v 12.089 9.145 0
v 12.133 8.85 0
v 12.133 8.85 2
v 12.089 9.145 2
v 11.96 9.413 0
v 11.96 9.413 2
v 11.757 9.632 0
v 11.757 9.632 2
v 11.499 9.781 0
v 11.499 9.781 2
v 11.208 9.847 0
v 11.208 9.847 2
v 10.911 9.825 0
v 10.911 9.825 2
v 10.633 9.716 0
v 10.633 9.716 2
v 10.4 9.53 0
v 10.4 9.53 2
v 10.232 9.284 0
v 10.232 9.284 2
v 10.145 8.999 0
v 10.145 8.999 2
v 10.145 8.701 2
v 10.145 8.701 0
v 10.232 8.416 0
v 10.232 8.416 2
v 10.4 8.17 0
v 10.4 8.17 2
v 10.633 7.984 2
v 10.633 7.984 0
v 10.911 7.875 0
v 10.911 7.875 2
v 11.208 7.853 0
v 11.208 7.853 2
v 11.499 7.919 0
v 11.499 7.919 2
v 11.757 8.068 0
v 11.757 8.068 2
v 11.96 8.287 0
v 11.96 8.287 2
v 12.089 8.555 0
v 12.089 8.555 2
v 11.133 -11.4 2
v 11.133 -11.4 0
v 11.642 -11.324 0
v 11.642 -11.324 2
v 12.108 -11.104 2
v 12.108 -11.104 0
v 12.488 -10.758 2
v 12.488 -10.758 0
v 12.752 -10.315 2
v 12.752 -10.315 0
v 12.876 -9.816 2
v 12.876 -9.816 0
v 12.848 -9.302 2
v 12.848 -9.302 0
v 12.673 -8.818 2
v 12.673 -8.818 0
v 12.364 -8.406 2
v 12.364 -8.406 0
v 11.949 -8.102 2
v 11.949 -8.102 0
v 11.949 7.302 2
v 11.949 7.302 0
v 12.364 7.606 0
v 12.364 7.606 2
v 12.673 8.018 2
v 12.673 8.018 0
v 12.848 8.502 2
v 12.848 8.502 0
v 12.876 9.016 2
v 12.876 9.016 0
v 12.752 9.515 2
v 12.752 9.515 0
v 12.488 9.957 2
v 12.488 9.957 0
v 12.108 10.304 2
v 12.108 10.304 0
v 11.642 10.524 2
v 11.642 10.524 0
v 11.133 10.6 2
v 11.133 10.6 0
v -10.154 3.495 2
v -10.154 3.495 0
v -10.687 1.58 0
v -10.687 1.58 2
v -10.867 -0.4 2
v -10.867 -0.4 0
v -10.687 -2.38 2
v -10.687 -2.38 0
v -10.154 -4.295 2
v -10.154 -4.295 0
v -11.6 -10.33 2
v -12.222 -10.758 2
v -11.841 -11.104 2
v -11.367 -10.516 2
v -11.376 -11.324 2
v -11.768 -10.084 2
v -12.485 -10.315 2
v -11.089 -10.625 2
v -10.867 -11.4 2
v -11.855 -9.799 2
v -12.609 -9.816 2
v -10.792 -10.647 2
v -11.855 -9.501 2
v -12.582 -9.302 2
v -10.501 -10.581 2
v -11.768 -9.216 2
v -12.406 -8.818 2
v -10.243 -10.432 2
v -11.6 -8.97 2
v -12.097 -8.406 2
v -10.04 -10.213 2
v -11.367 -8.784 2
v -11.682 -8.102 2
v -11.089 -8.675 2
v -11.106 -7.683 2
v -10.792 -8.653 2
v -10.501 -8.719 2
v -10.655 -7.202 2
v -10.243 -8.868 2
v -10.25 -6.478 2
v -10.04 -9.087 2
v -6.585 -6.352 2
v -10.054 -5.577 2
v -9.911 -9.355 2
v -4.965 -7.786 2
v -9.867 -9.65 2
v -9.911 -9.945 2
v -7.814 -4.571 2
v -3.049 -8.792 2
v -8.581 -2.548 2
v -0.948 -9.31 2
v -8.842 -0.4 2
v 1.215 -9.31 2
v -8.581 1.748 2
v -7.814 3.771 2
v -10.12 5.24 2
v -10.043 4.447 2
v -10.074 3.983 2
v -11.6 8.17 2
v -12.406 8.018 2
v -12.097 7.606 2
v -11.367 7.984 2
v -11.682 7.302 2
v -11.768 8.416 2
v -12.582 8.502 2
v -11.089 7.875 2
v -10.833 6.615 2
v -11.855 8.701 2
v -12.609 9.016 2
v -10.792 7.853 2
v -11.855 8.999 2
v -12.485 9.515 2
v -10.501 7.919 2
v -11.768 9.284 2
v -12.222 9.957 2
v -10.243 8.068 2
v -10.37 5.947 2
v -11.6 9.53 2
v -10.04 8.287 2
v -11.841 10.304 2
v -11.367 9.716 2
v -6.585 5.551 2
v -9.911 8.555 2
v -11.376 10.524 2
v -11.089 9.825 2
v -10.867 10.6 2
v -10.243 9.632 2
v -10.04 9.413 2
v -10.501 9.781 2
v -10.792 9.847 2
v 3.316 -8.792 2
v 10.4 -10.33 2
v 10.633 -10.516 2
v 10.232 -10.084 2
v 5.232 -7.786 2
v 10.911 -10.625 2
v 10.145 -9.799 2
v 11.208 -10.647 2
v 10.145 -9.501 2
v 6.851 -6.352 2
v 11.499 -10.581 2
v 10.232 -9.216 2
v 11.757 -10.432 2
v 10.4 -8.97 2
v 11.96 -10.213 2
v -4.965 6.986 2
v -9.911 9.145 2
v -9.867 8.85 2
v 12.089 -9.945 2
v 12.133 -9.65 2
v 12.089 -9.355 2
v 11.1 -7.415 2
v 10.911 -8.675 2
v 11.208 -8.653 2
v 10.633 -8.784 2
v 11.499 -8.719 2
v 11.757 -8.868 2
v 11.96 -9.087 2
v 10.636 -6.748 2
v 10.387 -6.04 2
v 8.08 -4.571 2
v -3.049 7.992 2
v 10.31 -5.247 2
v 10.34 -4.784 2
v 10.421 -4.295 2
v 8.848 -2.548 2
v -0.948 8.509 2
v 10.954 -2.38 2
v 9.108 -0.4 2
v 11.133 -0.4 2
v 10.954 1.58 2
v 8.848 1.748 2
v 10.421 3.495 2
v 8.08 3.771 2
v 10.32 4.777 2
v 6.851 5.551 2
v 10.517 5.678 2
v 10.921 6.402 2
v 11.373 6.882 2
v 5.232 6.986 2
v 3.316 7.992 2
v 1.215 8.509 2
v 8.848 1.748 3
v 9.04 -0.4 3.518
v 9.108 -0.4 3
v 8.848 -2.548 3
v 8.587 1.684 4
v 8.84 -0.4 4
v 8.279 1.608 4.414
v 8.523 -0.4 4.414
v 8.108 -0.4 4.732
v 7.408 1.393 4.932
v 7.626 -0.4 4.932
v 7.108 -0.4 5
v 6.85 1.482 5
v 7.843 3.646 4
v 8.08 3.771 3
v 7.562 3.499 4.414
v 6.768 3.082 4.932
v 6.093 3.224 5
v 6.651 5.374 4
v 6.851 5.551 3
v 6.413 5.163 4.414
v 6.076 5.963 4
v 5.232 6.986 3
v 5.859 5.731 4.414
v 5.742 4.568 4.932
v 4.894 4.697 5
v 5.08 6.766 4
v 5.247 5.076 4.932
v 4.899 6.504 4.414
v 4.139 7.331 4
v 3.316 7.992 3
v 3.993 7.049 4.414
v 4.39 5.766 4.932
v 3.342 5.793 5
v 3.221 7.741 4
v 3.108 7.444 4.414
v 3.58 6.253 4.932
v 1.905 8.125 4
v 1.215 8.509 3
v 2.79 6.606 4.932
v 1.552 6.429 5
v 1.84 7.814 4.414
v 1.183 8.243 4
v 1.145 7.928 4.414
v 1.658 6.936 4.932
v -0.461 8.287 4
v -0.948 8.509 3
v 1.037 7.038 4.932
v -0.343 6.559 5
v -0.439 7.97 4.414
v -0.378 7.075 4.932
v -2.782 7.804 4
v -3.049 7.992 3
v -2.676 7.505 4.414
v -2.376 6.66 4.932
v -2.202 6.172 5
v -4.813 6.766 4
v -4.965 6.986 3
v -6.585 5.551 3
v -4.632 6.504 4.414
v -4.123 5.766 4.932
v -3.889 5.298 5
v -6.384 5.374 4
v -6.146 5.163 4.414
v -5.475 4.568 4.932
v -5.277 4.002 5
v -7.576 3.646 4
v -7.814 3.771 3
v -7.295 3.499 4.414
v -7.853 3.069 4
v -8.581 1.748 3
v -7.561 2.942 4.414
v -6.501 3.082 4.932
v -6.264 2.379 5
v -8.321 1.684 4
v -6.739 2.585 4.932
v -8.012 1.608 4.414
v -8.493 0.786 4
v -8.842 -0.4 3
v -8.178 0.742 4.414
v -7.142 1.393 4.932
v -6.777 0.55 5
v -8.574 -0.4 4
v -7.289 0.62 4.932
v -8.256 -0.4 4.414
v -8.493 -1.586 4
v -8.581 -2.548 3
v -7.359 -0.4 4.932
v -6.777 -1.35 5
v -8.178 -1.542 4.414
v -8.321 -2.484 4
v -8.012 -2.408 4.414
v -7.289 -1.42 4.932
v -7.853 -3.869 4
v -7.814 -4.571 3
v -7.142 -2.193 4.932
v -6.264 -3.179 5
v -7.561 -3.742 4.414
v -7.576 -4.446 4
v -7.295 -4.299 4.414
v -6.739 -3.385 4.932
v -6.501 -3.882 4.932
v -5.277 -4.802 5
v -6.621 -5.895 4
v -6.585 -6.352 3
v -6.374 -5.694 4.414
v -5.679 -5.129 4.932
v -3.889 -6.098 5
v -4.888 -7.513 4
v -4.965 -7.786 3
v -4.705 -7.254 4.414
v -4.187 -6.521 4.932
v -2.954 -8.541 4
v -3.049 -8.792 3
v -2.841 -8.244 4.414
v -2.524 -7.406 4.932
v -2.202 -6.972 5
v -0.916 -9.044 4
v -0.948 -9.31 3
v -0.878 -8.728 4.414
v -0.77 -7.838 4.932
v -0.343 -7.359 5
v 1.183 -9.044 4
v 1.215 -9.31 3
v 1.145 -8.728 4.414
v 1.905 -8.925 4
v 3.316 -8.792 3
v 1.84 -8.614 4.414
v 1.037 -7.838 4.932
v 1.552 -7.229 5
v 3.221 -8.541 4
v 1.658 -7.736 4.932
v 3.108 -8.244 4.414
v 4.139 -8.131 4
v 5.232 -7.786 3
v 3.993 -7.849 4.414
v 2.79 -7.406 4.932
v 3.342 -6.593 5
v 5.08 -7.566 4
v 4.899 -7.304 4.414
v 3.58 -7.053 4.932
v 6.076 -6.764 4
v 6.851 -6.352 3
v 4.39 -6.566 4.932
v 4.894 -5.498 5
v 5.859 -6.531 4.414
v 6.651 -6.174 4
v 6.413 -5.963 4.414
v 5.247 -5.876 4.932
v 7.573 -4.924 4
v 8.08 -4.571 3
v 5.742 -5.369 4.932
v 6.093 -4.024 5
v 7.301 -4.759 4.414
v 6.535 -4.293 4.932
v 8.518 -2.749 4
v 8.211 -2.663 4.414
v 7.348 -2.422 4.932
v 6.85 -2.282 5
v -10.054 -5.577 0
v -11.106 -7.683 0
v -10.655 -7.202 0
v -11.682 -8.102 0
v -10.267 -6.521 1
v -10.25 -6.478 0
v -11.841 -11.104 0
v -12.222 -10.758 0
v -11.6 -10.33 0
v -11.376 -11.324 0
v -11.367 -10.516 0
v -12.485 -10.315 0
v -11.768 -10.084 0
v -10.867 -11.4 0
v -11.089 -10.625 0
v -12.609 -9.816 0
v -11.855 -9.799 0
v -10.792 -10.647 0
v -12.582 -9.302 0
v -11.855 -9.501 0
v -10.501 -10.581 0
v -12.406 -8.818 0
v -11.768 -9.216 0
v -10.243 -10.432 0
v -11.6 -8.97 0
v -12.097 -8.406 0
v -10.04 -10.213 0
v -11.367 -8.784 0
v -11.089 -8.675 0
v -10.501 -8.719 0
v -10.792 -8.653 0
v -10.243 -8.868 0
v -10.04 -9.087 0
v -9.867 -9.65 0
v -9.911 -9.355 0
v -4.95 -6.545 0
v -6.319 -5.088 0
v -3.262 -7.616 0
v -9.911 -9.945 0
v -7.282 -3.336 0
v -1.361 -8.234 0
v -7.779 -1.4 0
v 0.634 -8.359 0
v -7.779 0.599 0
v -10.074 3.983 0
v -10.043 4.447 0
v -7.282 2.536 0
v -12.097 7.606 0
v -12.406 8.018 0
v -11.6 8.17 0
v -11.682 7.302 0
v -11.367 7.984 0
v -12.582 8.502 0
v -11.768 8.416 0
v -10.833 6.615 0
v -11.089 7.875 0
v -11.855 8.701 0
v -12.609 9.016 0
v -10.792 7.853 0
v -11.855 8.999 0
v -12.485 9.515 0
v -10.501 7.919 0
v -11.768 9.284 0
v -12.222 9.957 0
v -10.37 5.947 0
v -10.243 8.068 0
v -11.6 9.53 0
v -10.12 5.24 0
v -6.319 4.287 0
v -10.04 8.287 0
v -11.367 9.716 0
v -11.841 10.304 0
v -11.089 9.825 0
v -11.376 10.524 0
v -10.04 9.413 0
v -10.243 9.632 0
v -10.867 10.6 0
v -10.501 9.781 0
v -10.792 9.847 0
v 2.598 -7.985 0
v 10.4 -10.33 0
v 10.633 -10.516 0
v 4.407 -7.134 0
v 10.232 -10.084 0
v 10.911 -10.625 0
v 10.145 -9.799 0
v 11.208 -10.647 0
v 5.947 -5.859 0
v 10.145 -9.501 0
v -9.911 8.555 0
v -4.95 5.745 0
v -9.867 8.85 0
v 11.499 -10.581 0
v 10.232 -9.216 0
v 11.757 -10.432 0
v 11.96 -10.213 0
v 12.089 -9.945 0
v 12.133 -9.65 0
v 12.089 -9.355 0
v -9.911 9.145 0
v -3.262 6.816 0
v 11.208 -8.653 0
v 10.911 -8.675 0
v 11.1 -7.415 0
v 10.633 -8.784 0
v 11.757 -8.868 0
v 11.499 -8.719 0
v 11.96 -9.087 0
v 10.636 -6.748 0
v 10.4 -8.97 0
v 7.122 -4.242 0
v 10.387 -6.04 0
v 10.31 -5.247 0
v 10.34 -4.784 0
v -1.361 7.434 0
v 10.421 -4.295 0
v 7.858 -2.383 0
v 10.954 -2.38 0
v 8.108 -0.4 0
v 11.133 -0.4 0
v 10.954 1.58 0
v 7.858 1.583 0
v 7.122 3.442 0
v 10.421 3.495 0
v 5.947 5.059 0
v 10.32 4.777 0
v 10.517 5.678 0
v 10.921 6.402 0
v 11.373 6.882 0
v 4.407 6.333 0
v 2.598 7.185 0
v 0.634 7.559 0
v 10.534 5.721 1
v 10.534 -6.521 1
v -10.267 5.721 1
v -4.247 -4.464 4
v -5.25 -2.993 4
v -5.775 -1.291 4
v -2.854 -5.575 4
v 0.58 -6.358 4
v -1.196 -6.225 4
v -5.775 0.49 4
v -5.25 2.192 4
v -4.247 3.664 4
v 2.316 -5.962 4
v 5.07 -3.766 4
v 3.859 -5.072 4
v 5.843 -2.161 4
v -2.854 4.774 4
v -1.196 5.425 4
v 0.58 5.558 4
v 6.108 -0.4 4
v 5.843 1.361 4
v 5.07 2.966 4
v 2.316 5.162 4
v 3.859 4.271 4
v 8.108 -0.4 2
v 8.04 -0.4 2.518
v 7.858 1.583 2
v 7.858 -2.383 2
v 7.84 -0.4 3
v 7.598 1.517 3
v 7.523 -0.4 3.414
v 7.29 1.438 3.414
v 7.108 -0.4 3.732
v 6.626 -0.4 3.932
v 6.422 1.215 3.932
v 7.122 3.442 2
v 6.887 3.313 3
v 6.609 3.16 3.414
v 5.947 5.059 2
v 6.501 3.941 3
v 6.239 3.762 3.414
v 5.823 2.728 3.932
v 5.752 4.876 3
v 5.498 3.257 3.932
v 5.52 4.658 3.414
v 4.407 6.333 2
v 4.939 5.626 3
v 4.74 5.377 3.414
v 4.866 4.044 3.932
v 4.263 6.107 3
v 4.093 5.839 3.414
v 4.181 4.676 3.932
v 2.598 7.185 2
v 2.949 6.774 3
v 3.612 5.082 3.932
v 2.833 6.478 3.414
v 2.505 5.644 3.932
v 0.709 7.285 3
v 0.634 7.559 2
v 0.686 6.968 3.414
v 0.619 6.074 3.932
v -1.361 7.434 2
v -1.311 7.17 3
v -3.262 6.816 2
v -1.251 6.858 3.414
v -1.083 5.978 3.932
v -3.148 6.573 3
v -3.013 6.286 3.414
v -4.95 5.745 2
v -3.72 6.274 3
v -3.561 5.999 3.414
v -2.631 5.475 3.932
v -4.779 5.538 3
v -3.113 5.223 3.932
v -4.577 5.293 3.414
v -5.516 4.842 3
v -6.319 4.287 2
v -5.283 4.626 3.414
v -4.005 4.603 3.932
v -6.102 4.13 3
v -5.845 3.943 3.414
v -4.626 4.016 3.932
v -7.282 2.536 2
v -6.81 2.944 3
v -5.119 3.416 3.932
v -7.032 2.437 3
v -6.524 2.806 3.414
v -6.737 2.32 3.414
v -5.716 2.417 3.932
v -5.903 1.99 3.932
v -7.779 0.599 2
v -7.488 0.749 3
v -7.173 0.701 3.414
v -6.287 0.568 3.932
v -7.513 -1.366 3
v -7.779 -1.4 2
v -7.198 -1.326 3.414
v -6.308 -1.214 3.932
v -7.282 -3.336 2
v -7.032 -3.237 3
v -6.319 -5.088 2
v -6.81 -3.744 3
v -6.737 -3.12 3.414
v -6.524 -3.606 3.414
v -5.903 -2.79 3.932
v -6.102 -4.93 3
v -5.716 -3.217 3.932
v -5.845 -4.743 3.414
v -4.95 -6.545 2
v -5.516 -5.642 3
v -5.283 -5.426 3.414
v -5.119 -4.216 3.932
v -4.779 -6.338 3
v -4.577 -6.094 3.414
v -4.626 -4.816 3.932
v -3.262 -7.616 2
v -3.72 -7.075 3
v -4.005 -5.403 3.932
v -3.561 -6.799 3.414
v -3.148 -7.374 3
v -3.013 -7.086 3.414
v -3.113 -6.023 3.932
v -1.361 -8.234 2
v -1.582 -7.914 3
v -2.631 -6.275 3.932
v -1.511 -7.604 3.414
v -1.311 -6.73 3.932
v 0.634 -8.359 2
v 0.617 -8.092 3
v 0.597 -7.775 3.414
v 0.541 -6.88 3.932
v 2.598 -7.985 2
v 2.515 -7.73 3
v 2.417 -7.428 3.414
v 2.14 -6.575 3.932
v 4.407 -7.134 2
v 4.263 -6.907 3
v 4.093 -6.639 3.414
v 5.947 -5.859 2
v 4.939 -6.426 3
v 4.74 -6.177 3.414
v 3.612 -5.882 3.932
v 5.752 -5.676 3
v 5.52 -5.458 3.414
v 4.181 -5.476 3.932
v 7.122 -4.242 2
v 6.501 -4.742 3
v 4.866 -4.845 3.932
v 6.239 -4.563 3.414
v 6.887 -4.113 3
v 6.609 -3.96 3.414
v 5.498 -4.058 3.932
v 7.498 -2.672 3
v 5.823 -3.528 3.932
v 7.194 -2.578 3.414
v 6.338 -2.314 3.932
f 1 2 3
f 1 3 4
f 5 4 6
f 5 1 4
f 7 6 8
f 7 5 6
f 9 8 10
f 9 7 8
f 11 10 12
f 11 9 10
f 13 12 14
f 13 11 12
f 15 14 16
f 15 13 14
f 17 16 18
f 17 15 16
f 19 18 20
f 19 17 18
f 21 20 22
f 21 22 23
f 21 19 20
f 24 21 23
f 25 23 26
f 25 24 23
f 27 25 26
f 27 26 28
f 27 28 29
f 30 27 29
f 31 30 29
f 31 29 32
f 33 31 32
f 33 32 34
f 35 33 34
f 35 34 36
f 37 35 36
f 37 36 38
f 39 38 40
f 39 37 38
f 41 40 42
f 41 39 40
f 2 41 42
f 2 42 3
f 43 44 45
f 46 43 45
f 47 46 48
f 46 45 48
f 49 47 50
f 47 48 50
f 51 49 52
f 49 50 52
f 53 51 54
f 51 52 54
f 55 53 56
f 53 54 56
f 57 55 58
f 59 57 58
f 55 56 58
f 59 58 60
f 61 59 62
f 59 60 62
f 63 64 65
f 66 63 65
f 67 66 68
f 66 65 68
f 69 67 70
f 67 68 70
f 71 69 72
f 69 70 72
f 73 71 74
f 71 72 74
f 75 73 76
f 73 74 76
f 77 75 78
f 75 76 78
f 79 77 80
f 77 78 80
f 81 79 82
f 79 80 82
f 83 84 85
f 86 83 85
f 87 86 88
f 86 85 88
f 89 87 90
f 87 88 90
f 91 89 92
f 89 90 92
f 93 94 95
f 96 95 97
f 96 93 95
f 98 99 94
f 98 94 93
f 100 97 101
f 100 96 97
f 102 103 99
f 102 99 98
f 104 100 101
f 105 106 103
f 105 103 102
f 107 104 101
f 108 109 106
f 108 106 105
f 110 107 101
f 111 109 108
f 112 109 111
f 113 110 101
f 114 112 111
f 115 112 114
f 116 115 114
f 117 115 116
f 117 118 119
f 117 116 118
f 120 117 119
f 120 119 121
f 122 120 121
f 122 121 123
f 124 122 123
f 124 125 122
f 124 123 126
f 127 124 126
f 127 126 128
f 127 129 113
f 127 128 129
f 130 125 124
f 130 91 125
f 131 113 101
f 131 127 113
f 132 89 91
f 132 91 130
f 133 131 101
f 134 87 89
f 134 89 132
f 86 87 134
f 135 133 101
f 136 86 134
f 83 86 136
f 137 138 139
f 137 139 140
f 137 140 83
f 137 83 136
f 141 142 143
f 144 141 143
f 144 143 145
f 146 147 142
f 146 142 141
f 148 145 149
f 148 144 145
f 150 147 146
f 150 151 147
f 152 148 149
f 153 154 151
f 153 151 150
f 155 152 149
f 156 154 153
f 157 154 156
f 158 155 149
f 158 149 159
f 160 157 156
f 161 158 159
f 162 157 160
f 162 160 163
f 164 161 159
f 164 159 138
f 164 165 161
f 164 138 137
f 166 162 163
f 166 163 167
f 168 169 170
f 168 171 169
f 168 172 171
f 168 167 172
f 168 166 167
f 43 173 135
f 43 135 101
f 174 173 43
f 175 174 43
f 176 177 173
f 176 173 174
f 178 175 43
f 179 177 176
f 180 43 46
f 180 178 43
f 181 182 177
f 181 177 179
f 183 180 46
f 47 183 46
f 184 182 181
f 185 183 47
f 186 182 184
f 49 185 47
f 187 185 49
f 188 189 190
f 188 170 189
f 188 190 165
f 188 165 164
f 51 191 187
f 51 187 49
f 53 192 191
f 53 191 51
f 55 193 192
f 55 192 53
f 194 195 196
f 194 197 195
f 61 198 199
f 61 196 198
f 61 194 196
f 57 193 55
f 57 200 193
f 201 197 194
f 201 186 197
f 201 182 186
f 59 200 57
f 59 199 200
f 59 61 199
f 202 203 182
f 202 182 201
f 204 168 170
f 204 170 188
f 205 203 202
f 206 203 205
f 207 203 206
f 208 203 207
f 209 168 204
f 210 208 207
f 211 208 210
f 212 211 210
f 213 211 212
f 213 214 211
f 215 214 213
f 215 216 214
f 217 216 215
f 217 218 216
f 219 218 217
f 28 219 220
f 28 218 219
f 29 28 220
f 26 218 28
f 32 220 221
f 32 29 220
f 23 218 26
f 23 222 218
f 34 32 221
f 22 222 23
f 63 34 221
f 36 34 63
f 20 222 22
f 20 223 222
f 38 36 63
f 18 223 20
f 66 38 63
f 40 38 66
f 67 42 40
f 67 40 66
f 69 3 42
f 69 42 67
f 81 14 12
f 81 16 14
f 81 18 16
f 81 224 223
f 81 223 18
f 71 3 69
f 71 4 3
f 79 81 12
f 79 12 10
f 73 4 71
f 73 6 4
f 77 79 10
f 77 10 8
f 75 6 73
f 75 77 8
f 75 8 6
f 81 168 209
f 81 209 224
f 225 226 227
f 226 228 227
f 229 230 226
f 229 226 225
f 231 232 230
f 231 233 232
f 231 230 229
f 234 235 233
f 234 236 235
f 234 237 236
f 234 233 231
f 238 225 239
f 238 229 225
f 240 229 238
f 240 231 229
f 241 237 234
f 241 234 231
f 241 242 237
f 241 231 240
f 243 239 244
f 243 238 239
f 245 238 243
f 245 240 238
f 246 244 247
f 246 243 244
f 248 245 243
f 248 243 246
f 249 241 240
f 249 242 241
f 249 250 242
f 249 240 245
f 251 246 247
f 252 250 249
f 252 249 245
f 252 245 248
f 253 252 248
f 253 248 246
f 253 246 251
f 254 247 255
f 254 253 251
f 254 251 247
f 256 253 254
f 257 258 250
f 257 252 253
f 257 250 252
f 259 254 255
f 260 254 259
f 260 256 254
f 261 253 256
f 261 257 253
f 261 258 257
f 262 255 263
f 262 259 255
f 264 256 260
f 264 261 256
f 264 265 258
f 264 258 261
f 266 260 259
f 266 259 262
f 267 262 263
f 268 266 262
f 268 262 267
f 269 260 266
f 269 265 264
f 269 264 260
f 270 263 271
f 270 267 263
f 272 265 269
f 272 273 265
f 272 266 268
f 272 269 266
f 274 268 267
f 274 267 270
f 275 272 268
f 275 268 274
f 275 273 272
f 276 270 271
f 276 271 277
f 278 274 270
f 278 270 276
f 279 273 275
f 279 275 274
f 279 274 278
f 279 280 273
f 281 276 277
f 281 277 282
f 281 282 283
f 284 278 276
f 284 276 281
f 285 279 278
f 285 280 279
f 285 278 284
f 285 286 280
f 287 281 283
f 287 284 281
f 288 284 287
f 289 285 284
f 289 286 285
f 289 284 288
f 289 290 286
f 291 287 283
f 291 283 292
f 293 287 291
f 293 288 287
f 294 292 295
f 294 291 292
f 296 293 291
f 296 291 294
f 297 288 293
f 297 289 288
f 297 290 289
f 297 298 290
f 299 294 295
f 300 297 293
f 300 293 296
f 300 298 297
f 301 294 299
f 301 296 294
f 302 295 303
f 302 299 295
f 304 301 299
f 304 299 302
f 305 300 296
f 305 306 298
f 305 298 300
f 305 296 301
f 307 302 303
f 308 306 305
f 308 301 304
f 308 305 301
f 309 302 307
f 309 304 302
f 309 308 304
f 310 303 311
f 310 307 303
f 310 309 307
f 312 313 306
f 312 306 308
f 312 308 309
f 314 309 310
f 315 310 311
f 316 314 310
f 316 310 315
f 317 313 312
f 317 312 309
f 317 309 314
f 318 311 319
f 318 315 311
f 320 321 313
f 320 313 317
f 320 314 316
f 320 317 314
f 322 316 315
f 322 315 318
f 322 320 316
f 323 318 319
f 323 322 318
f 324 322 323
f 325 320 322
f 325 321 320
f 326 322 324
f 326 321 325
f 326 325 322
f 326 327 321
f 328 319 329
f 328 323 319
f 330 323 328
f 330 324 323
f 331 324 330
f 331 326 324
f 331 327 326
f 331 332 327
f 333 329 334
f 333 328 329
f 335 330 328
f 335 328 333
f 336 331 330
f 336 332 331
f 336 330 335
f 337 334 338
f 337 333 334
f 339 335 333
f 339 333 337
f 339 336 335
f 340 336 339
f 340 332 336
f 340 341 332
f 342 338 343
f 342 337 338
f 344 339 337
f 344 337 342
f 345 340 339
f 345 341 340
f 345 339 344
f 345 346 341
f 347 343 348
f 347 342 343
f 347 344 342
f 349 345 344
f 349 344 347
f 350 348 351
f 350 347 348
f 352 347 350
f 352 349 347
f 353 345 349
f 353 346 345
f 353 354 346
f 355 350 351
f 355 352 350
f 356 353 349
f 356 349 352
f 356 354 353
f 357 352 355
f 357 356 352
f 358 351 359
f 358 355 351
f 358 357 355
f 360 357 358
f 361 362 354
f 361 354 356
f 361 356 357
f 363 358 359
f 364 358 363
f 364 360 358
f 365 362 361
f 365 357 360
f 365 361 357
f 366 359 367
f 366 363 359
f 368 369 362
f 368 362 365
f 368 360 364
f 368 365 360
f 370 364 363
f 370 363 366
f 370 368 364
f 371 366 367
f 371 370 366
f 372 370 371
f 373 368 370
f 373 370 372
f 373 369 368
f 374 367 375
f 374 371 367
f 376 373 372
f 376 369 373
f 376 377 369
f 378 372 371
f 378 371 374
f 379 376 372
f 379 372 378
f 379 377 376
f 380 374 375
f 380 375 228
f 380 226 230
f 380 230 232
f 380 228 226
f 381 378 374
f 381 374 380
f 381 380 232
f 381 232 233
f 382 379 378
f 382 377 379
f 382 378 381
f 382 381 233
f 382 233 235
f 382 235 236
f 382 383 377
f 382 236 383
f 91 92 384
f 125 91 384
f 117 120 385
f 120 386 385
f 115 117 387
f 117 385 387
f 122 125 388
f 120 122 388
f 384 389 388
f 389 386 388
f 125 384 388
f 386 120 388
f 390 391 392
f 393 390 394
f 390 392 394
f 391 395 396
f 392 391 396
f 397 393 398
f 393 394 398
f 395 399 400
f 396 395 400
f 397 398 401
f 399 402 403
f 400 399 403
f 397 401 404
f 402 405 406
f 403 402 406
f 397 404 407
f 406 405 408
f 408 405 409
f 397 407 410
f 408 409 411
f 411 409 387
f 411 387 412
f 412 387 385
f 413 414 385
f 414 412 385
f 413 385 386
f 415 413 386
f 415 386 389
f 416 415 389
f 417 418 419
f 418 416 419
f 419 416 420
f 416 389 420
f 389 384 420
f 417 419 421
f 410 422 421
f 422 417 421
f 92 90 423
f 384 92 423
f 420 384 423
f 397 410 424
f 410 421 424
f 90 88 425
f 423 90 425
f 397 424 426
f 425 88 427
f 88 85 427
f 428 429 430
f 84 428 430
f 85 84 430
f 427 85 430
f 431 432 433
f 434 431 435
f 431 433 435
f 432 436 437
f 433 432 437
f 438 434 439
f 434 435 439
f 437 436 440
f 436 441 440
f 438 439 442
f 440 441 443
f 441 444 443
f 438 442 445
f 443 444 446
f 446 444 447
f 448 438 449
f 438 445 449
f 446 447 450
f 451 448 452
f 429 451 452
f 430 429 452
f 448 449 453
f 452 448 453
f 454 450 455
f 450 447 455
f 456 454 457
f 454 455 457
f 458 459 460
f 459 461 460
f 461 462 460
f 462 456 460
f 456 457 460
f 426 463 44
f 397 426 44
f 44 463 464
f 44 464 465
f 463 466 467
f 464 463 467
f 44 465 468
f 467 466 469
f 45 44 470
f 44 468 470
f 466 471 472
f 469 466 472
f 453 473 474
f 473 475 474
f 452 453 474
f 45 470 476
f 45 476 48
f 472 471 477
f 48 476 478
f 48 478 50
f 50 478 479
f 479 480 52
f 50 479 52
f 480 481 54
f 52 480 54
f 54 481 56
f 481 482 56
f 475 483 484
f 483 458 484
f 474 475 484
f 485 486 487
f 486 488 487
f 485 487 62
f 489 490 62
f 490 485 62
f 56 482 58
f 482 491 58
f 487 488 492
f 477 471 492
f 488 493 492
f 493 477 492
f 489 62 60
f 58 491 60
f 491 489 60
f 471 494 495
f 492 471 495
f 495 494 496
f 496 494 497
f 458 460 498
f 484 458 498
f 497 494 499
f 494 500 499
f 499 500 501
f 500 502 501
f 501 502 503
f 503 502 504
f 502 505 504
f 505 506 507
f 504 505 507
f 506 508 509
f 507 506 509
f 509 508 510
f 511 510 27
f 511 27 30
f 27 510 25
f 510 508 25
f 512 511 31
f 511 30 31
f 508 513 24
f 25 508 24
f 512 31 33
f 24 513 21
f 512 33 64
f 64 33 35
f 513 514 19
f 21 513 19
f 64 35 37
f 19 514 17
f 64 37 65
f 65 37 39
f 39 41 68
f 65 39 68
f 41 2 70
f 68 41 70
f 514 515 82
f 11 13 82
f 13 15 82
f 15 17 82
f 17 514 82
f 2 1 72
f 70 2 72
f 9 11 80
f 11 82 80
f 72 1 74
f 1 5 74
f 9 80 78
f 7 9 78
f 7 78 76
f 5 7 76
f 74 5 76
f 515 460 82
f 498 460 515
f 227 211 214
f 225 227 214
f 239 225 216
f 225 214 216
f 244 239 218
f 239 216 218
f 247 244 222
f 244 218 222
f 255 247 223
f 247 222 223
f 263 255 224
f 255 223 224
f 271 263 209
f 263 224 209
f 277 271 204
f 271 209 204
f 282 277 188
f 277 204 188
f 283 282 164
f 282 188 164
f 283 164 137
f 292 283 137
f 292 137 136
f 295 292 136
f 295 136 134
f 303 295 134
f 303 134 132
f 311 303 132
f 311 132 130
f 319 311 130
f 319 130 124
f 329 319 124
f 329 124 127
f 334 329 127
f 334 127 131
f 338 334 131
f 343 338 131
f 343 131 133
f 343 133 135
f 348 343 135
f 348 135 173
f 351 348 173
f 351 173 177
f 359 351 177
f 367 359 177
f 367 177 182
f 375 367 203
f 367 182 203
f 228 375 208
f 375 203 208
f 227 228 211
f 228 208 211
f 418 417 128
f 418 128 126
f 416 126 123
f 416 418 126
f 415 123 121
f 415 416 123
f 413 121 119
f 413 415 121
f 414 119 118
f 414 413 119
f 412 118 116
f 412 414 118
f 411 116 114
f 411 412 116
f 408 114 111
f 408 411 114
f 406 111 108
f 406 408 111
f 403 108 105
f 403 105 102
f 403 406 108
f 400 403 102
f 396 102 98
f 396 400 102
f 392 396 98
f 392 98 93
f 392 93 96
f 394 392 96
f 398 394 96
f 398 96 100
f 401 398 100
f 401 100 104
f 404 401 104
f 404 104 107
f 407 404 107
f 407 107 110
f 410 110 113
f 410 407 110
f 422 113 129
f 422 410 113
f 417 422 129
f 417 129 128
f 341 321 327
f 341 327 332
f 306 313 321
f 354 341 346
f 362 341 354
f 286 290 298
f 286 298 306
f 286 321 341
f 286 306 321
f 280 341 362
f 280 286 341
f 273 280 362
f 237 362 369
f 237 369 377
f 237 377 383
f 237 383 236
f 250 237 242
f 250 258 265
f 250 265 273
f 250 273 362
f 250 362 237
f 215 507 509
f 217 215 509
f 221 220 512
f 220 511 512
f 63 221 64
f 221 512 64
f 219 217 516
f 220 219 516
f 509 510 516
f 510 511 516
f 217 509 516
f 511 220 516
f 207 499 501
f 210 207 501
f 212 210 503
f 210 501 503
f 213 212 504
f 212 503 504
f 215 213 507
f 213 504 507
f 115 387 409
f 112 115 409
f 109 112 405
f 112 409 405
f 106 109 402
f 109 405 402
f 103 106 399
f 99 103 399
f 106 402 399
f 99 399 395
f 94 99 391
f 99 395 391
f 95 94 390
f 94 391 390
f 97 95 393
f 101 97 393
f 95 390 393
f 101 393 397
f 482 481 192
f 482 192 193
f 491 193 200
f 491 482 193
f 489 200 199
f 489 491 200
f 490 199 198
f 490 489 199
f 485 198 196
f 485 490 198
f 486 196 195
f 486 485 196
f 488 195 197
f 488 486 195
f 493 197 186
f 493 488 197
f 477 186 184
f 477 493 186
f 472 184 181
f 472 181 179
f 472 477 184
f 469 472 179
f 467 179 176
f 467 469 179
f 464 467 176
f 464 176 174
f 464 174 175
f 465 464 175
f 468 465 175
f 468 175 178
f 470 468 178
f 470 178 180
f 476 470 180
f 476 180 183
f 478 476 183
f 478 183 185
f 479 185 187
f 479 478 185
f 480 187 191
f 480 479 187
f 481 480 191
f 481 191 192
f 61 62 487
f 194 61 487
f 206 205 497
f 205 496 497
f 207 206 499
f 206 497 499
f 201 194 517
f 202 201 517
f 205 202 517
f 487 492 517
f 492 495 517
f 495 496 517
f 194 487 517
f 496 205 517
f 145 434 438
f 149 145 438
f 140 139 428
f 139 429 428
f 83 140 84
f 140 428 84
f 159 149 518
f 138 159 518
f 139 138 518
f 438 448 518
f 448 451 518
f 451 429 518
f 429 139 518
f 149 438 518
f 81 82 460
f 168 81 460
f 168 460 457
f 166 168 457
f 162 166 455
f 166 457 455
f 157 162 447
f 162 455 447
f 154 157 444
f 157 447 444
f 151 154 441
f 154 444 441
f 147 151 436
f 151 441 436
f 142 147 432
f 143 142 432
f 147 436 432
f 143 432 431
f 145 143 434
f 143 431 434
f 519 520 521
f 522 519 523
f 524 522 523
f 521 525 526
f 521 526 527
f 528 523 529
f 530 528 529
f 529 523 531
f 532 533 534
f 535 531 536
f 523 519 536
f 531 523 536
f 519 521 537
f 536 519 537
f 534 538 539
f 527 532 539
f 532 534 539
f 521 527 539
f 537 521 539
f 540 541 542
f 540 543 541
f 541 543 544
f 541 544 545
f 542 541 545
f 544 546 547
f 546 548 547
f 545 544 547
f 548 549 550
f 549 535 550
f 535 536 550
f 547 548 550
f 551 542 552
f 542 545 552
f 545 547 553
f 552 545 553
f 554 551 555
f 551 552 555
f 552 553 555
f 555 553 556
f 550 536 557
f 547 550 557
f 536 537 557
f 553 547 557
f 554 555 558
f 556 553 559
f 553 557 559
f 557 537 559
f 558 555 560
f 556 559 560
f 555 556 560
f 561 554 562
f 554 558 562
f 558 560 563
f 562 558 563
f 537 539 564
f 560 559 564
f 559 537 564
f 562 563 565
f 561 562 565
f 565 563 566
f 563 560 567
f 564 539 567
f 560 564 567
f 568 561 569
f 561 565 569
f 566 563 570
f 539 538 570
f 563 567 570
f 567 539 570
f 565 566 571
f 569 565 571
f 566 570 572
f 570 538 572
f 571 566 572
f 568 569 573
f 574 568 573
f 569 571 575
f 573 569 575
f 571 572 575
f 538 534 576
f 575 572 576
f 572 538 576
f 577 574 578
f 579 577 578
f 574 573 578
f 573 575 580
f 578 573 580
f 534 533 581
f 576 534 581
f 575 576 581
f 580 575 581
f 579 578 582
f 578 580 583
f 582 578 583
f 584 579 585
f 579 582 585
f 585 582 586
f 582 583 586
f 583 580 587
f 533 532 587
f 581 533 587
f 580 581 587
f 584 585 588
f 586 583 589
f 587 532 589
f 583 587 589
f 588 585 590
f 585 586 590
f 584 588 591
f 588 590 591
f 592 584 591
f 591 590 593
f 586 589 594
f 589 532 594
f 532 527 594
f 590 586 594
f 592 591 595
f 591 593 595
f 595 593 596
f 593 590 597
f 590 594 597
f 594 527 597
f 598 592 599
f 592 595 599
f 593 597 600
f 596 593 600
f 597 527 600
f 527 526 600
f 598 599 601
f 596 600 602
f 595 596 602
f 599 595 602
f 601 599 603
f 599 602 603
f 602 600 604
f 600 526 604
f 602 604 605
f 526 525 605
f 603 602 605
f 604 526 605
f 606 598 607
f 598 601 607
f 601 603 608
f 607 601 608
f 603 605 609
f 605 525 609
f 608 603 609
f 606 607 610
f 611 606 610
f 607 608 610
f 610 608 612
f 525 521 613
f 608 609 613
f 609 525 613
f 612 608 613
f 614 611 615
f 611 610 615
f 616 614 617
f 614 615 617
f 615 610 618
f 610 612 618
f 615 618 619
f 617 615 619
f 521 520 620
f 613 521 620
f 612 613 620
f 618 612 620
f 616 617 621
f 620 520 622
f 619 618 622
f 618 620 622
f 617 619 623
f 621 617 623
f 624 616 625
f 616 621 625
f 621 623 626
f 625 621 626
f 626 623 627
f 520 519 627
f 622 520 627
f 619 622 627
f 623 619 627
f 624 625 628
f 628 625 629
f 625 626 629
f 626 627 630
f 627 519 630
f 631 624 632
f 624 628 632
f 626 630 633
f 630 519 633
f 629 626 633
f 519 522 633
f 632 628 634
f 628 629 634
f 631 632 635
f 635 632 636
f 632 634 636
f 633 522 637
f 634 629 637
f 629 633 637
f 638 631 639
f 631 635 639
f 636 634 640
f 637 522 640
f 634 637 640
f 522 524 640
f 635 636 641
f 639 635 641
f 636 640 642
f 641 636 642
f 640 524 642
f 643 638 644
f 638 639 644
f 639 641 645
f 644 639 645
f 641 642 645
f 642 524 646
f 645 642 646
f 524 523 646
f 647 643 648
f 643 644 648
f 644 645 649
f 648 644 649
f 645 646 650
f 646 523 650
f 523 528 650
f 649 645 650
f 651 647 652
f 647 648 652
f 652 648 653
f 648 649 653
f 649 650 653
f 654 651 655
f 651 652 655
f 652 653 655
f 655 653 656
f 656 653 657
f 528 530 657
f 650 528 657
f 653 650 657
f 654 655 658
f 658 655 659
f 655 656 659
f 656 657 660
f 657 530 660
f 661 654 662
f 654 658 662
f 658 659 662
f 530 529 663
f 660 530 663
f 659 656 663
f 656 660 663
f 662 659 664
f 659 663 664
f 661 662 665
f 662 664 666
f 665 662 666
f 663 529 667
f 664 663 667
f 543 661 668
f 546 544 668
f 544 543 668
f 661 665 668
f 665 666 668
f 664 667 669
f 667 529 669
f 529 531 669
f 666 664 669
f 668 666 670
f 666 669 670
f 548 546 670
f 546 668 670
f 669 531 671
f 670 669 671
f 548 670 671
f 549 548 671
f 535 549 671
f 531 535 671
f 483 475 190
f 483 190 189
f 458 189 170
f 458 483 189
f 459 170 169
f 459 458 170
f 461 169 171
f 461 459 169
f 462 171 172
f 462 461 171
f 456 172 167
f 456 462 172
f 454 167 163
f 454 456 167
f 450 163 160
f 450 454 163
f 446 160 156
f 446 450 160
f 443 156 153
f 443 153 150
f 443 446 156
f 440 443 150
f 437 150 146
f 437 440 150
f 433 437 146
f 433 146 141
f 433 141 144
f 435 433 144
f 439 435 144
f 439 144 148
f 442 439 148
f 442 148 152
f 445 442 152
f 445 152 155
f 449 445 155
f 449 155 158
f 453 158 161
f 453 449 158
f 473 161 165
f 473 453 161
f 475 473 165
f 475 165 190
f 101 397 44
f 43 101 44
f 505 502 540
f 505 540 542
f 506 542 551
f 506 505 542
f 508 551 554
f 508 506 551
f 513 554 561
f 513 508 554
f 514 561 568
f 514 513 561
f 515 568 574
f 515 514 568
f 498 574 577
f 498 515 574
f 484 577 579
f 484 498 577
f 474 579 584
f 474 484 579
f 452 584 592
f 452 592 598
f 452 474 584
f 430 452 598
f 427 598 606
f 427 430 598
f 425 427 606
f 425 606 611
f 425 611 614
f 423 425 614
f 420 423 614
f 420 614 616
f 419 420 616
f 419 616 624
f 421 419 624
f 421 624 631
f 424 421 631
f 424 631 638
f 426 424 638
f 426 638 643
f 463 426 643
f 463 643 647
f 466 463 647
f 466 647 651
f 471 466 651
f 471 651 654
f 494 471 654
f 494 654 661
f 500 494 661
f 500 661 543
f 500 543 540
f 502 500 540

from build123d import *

# Parameters (mm, degrees)
SKETCH1_R           = 1
SKETCH1_R_2         = 7.975
BOSS_EXTRUDE1_DEPTH = 2
SKETCH2_R           = 8.975
SKETCH2_R_2         = 7.975
BOSS_EXTRUDE2_DEPTH = 2
SKETCH3_R           = 8.975
BOSS_EXTRUDE3_DEPTH = 1
FILLET1_R           = 2


with BuildPart() as part:
    # Sketch1 → Boss-Extrude1 (new body)
    with BuildSketch(Plane.XY):
        with BuildLine():
            Line((-10.866636256, -11.400091233), (11.133363744, -11.400091233))
            ThreePointArc((11.133363744, -11.400091233), (12.832206534, -10.070130727), (11.948884962, -8.101729149))
            add(Edge.make_bspline(
                [(11.948884962, -8.101729149), (9.883447826, -6.844292891), (10.420778008, -4.294845111)],
                knots=[0, 0, 0, 1, 1, 1], degree=2))
            ThreePointArc((10.420778008, -4.294845111), (11.133363745, -0.400091249), (10.420778018, 3.494662613))
            add(Edge.make_bspline(
                [(10.420778018, 3.494662613), (9.883447814, 6.044110418), (11.948884963, 7.301546684)],
                knots=[0, 0, 0, 1, 1, 1], degree=2))
            ThreePointArc((11.948884963, 7.301546684), (12.832206534, 9.269948262), (11.133363744, 10.599908767))
            Line((11.133363744, 10.599908767), (-10.866636256, 10.599908767))
            ThreePointArc((-10.866636256, 10.599908767), (-12.565479045, 9.269948261), (-11.682157474, 7.301546683))
            add(Edge.make_bspline(
                [(-11.682157474, 7.301546683), (-9.616720338, 6.044110425), (-10.15405052, 3.494662645)],
                knots=[0, 0, 0, 1, 1, 1], degree=2))
            ThreePointArc((-10.15405052, 3.494662645), (-10.866636257, -0.400091216), (-10.15405053, -4.294845078))
            add(Edge.make_bspline(
                [(-10.15405053, -4.294845078), (-9.616720326, -6.844292883), (-11.682157475, -8.101729149)],
                knots=[0, 0, 0, 1, 1, 1], degree=2))
            ThreePointArc((-11.682157475, -8.101729149), (-12.565479045, -10.070130727), (-10.866636256, -11.400091233))
        make_face()
        with Locations((-10.866636256, -9.650091233)):
            Circle(SKETCH1_R, mode=Mode.SUBTRACT)
        with Locations((11.133363744, -9.650091233)):
            Circle(SKETCH1_R, mode=Mode.SUBTRACT)
        with Locations((-10.866636256, 8.849908767)):
            Circle(SKETCH1_R, mode=Mode.SUBTRACT)
        with Locations((11.133363744, 8.849908767)):
            Circle(SKETCH1_R, mode=Mode.SUBTRACT)
        with Locations((0.133363744, -0.400091233)):
            Circle(SKETCH1_R_2, mode=Mode.SUBTRACT)
    extrude(amount=BOSS_EXTRUDE1_DEPTH)

    # Sketch2 → Boss-Extrude2 (add)
    with BuildSketch(Plane.XY.offset(2)):
        with Locations((0.133363744, -0.400091233)):
            Circle(SKETCH2_R)
        with Locations((0.133363744, -0.400091233)):
            Circle(SKETCH2_R_2, mode=Mode.SUBTRACT)
    extrude(amount=BOSS_EXTRUDE2_DEPTH)

    # Sketch3 → Boss-Extrude3 (add)
    with BuildSketch(Plane.XY.offset(4)):
        with Locations((0.133363744, -0.400091233)):
            Circle(SKETCH3_R)
    extrude(amount=BOSS_EXTRUDE3_DEPTH)

    # Fillet1
    fillet1_edges = [part.edges().sort_by_distance(p)[0] for p in [
        (-8.841636256, -0.400091233, 5),
        (-7.841636256, -0.400091233, 4),
    ]]
    fillet(fillet1_edges, radius=FILLET1_R)


solid = part.part
